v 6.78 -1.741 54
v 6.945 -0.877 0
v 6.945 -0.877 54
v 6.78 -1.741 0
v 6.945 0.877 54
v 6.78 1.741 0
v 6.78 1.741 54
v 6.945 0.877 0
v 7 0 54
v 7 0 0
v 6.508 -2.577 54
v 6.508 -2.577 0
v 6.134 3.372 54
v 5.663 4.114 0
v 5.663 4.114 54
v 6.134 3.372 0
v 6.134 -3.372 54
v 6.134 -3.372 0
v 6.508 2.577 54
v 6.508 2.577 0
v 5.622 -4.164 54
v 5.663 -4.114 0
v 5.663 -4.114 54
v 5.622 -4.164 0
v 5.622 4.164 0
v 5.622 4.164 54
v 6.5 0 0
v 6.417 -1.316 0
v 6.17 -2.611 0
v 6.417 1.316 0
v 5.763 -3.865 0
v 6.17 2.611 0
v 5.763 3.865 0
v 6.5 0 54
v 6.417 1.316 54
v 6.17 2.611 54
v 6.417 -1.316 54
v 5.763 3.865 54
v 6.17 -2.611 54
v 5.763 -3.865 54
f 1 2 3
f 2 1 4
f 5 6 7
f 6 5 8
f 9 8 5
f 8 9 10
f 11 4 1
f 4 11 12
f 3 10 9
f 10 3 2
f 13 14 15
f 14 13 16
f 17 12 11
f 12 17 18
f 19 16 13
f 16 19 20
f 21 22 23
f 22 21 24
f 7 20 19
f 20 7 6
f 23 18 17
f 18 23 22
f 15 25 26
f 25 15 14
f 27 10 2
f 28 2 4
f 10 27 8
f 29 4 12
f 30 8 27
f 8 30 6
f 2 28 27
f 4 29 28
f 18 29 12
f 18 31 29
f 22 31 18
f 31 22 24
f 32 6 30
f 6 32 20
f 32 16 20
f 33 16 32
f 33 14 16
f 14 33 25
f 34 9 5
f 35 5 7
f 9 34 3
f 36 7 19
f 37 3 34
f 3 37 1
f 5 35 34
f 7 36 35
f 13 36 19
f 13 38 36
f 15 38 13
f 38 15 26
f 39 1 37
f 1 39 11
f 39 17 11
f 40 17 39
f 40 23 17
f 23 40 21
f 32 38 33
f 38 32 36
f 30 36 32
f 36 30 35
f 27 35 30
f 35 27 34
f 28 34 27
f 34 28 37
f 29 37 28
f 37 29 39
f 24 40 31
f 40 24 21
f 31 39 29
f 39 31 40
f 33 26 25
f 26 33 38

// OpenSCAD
$fn = 50;


difference() {
	union() {
		cylinder(h = 54, r = 7.0000000000);
		translate(v = [-7.0000000000, 0, 0]) {
			cylinder(h = 54, r = 7.0000000000);
		}
	}
	union() {
		cylinder(h = 54, r = 3.2500000000);
		cylinder(h = 54, r = 1.8000000000);
		cylinder(h = 54, r = 1.8000000000);
		cylinder(h = 54, r = 1.8000000000);
		translate(v = [-11.5000000000, 0, 0]) {
			hull() {
				translate(v = [-3.7500000000, 0.0000000000, 0]) {
					cylinder(h = 54, r = 10.5000000000);
				}
				translate(v = [3.7500000000, 0.0000000000, 0]) {
					cylinder(h = 54, r = 10.5000000000);
				}
				translate(v = [-3.7500000000, -0.0000000000, 0]) {
					cylinder(h = 54, r = 10.5000000000);
				}
				translate(v = [3.7500000000, -0.0000000000, 0]) {
					cylinder(h = 54, r = 10.5000000000);
				}
			}
		}
		translate(v = [-4.0000000000, 0, 0.0000000000]) {
			cylinder(h = 54, r = 10.5000000000);
		}
	}
}
